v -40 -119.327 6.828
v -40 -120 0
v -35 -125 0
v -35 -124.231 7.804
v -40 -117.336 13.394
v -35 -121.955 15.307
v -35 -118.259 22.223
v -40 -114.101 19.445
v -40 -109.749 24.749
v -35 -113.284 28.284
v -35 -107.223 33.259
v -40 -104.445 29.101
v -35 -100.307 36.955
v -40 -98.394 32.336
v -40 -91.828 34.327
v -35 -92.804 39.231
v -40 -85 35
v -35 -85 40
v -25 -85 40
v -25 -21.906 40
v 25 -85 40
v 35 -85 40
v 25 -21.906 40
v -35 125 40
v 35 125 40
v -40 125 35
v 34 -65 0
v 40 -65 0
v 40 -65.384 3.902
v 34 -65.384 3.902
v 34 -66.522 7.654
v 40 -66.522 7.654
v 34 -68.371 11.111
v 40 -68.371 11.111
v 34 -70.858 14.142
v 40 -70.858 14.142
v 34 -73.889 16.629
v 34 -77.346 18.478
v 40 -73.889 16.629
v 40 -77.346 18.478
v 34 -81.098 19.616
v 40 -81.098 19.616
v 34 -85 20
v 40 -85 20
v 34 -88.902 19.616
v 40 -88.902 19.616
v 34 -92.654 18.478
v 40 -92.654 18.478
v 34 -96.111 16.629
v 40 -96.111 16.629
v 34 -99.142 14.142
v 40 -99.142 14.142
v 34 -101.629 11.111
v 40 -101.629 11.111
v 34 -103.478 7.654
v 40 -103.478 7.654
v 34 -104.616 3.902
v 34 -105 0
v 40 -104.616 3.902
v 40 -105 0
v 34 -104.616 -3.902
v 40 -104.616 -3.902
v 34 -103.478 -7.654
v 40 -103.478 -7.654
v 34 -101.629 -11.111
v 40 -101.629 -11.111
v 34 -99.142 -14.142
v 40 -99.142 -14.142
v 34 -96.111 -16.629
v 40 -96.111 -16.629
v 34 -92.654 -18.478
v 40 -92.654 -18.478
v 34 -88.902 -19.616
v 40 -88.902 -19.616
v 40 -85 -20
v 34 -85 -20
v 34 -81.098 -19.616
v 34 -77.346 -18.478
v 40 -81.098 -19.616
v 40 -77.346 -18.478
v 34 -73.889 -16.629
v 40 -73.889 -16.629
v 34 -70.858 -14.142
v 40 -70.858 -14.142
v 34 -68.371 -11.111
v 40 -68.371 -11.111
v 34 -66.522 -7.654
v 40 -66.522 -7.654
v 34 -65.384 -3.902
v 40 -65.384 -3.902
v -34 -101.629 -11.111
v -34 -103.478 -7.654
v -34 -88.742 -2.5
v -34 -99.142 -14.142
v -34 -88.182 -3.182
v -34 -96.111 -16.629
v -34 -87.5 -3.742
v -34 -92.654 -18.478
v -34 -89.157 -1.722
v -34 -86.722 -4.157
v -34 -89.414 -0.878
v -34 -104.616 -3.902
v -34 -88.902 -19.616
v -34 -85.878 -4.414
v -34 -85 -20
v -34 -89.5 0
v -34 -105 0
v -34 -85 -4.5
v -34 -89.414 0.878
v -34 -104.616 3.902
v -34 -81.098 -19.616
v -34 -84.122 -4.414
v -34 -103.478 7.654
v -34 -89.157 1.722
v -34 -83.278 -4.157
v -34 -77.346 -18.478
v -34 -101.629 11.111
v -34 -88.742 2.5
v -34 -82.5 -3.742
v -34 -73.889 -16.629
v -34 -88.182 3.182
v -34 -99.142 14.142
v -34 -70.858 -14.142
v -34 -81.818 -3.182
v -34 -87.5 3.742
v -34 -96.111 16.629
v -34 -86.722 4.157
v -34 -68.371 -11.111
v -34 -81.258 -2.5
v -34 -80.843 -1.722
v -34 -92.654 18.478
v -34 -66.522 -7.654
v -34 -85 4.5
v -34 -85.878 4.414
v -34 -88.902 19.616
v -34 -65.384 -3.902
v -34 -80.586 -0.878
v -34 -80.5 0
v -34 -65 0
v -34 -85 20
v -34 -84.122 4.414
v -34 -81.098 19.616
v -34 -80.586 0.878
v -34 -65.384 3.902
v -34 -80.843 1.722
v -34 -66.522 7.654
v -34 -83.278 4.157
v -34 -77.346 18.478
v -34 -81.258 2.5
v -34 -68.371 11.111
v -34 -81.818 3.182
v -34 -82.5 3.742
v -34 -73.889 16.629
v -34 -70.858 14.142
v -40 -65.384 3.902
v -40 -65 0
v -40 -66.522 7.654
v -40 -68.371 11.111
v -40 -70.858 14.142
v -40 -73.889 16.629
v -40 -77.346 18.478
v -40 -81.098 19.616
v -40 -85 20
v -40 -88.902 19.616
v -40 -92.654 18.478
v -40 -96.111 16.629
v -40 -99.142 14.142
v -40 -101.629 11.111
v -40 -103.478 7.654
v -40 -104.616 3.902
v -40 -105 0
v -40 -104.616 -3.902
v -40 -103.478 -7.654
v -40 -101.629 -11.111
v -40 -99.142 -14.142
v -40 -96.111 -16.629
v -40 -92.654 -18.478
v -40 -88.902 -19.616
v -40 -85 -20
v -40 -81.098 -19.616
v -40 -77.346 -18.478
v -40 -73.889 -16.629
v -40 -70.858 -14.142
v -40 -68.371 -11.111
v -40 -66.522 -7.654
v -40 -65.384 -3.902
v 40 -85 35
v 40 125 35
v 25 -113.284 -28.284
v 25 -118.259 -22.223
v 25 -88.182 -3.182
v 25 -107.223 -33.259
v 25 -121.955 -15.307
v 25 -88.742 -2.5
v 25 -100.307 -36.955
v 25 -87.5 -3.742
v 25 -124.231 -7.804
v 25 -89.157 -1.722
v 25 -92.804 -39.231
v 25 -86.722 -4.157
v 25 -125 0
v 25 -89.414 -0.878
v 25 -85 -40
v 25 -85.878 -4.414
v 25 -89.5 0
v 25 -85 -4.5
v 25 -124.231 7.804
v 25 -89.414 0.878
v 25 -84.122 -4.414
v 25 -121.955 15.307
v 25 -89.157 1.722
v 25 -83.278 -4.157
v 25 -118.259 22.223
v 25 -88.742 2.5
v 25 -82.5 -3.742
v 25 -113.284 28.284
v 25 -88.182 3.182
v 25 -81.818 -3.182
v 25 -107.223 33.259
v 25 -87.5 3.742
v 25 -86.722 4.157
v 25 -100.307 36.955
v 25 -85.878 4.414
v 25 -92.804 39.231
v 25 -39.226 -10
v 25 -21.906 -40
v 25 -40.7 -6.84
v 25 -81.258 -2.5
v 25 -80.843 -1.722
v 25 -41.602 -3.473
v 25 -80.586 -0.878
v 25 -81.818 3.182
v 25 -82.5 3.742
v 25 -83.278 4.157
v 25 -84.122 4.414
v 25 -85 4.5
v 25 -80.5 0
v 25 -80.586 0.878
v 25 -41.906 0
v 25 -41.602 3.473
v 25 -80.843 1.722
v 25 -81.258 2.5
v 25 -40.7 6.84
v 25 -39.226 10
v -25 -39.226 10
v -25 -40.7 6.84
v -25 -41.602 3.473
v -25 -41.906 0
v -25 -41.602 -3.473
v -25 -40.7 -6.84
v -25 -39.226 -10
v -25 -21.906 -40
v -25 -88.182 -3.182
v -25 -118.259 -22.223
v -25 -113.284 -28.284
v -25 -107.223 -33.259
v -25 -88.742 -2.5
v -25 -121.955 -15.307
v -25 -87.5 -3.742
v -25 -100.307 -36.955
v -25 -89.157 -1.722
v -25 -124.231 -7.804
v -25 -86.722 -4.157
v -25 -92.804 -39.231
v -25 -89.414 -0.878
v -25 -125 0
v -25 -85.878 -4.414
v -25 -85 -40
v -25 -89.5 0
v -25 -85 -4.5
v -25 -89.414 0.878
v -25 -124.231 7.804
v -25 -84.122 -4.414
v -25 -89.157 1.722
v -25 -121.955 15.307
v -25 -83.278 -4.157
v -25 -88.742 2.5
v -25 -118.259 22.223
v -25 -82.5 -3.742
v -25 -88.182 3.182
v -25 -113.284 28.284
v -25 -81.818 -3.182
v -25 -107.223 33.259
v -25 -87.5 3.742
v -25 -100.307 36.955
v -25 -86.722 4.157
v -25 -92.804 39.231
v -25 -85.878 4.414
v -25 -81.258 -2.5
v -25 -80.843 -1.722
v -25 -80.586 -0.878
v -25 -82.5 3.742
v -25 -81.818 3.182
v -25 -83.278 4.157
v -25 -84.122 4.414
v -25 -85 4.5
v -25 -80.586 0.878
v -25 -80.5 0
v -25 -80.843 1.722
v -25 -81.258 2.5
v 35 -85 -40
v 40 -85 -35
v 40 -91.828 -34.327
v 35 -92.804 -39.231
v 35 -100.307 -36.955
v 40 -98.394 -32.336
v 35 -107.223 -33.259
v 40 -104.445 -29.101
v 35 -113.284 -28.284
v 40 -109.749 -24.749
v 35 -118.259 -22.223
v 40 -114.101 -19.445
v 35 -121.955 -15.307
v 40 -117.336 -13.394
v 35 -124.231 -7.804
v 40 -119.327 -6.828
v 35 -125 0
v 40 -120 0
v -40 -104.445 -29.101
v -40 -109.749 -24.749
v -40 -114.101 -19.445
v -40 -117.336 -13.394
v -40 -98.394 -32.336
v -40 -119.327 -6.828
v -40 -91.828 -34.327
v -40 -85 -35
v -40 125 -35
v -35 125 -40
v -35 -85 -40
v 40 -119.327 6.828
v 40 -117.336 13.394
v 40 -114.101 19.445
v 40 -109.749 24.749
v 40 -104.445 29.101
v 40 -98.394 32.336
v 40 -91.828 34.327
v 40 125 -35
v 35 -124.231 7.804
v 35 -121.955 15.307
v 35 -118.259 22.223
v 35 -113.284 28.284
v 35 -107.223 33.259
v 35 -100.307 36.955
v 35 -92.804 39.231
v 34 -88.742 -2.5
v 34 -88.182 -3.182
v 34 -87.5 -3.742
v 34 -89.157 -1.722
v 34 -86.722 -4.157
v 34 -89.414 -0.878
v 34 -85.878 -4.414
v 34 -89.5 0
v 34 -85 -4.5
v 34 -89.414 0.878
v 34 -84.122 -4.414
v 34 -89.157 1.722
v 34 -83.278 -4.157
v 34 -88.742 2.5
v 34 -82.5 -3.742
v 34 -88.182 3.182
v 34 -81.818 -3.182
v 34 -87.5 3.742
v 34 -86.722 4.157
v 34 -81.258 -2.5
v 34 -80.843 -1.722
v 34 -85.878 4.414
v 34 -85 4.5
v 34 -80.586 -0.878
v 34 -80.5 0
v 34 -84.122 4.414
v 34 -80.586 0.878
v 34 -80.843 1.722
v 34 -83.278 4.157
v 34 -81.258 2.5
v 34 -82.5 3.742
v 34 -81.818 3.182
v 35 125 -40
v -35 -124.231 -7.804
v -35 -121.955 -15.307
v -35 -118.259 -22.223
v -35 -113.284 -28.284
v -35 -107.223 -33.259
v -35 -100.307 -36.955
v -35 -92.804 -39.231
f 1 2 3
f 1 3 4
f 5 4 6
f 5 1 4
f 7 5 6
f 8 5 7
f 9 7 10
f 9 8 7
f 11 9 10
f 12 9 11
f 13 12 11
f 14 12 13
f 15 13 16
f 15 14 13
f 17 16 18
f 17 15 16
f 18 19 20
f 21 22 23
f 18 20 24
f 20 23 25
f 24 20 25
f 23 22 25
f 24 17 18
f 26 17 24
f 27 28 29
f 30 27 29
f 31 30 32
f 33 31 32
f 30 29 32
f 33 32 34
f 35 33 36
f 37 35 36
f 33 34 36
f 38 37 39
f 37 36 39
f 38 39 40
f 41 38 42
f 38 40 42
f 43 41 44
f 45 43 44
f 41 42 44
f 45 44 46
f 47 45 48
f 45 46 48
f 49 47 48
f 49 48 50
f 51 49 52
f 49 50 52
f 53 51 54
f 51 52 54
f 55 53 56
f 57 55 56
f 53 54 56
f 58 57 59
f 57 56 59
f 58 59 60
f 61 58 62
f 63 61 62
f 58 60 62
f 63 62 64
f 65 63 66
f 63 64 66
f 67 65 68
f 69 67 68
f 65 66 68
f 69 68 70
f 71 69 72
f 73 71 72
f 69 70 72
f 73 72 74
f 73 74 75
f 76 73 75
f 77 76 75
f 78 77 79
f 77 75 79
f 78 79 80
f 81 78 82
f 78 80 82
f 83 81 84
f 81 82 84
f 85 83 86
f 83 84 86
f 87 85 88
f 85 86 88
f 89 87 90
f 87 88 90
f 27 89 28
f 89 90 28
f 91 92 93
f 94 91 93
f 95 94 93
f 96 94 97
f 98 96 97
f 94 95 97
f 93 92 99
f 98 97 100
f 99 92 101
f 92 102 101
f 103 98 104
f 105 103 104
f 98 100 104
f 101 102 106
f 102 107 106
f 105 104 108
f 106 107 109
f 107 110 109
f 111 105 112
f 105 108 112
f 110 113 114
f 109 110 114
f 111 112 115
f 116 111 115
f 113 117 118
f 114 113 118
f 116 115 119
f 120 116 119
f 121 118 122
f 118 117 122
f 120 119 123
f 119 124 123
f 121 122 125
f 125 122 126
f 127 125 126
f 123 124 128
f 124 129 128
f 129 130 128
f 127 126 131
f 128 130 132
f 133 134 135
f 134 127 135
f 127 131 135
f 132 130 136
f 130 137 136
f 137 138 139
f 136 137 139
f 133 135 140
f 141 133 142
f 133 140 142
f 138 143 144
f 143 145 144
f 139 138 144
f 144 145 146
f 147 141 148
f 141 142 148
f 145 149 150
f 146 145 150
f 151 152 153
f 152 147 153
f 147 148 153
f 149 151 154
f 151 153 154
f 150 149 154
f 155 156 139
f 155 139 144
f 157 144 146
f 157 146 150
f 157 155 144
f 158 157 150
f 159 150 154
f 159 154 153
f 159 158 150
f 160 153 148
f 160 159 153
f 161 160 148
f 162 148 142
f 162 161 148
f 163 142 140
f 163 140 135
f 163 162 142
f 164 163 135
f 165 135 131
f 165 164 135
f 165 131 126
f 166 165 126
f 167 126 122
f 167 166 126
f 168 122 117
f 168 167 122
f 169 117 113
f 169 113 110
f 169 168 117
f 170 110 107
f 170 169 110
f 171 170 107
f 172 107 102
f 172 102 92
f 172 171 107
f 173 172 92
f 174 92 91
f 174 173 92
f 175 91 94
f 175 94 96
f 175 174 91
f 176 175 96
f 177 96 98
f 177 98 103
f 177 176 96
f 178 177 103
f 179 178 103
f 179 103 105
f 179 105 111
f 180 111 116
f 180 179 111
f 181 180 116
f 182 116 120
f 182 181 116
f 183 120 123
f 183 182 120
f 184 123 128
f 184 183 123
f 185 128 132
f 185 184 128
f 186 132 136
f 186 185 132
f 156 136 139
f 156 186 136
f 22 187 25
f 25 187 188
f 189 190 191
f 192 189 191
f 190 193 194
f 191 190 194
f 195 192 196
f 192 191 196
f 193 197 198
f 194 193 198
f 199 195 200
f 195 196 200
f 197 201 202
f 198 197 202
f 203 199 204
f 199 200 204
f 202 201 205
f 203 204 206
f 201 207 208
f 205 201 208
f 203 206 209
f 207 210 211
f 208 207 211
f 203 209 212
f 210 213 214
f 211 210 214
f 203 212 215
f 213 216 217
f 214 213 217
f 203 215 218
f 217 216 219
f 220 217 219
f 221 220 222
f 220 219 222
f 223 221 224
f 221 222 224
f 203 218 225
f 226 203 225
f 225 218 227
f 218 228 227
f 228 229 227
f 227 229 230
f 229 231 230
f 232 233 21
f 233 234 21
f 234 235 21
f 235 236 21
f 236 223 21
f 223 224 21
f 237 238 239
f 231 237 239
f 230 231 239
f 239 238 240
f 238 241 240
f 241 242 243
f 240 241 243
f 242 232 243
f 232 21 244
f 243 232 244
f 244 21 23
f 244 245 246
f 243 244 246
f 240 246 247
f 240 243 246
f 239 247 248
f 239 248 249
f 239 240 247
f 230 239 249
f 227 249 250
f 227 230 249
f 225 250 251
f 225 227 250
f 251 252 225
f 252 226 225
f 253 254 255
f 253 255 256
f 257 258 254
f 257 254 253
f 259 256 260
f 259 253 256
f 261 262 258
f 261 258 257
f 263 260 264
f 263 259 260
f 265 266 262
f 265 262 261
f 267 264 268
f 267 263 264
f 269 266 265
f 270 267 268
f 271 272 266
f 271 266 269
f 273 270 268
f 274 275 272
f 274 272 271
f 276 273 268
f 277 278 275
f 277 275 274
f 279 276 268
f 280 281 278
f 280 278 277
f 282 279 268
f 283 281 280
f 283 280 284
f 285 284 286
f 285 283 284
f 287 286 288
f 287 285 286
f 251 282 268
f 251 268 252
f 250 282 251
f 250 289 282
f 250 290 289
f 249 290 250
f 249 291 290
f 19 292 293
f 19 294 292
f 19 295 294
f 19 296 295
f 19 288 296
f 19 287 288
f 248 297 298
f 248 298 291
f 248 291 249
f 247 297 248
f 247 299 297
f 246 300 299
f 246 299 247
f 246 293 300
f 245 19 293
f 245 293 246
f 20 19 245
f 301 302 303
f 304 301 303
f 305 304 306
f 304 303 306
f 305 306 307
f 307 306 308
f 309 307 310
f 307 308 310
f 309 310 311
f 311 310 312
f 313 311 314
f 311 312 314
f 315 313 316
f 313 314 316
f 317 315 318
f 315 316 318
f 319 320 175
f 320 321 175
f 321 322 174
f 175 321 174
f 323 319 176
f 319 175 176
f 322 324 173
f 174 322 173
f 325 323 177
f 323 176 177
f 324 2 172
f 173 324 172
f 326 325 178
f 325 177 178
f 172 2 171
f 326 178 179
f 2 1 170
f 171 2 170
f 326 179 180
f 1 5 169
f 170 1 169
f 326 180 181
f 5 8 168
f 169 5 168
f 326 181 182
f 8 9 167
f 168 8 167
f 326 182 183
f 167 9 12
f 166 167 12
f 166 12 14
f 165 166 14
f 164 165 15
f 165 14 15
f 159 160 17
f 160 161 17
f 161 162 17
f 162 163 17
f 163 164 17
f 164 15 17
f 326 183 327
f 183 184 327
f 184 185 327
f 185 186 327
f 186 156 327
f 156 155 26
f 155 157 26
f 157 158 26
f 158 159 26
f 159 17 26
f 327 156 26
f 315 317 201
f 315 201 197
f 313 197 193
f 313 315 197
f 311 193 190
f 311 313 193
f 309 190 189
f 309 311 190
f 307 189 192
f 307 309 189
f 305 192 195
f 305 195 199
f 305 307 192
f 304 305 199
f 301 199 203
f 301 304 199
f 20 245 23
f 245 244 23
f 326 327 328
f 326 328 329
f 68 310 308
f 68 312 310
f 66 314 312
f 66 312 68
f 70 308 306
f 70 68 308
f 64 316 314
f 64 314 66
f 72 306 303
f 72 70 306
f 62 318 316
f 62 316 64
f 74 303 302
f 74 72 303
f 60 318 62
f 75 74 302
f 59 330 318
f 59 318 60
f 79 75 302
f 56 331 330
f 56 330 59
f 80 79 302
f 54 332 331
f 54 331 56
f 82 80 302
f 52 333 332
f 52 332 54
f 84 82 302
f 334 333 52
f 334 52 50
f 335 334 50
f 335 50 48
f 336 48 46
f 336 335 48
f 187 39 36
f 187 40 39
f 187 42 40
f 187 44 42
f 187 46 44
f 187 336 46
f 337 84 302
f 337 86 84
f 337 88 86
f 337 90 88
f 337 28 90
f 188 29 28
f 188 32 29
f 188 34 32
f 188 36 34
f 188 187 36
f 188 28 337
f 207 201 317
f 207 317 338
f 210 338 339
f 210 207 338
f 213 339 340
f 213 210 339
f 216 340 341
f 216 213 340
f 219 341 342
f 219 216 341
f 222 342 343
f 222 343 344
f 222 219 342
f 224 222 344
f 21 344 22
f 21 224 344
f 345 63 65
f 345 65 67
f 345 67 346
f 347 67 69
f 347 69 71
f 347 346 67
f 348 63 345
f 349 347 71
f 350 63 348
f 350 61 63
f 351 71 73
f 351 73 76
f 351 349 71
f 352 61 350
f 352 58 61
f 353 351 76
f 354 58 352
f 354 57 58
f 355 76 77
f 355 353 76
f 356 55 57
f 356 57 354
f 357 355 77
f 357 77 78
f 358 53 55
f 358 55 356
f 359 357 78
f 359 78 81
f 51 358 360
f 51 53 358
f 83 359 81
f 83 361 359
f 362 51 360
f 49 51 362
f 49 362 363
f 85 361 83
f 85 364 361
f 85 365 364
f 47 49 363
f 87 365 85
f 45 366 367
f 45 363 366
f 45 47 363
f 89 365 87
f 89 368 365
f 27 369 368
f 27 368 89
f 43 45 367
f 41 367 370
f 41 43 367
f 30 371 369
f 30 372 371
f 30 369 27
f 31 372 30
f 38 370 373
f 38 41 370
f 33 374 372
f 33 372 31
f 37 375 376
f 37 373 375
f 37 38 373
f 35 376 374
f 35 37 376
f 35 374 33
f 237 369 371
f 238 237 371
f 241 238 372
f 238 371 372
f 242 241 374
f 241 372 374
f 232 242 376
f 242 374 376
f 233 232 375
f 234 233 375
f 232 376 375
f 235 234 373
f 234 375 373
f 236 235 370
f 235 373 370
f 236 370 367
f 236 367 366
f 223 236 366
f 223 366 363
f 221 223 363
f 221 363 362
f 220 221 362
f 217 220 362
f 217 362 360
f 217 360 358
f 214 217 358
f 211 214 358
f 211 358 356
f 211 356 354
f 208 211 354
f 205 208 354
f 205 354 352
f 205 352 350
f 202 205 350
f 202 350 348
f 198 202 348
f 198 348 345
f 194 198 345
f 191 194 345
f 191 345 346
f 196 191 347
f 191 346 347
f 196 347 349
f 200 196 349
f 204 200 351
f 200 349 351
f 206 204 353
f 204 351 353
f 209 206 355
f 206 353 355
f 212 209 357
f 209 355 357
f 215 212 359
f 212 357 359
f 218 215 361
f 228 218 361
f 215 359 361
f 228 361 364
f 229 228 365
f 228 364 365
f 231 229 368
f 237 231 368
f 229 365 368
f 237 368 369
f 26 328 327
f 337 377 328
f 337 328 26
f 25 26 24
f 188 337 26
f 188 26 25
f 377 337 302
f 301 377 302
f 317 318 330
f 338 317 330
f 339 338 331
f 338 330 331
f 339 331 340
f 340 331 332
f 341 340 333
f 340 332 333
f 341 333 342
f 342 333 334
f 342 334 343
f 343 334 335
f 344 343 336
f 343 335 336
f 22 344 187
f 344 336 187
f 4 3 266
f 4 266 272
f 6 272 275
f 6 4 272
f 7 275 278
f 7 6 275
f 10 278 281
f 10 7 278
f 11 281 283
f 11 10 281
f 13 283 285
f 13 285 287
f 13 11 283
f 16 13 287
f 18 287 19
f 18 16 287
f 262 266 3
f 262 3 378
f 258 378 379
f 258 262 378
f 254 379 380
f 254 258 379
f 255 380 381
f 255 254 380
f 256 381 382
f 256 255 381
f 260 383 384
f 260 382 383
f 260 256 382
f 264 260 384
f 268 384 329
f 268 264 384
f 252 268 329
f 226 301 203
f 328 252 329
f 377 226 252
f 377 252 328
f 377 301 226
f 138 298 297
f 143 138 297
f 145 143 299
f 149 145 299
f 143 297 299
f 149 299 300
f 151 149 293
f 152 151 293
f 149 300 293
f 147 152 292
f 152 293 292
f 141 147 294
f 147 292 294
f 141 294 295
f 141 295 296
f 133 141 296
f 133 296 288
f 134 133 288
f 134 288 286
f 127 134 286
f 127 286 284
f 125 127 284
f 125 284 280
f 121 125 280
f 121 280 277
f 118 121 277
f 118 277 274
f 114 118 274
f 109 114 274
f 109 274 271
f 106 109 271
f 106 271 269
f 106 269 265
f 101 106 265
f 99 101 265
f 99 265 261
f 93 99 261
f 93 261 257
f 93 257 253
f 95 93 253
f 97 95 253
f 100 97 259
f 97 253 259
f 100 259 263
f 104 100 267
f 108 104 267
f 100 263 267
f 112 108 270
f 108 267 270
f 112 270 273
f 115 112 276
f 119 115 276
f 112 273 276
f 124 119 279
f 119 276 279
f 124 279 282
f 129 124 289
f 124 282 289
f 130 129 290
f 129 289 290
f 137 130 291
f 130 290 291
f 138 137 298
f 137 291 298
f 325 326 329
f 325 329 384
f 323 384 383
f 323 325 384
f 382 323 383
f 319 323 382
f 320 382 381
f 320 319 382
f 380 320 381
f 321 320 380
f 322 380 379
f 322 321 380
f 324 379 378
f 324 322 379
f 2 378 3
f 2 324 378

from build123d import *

# Parameters (mm, degrees)
F0_W      = 250
F0_H      = 80
F1_DEPTH  = 40
F2_R      = 39.99999
F4_DEPTH  = 25
F5_R      = 20
F6_SIZE   = 5
F7_R      = 4.5
F8_DEPTH  = 80.001
F9_R      = 20
F10_DEPTH = 6


# Not quite as in the source:
# - a fillet or chamfer is up to 0.001 mm smaller than in the source, because OpenCascade refuses the exact size
# - a pattern or mirror of a feature is missing from the dataset's text; its kind, count and spacing are read off the source's solid


with BuildPart() as f1:
    # F0 (on Right) → F1 (new body, symmetric)
    with BuildSketch(Plane.YZ):
        Rectangle(F0_W, F0_H)
    extrude(amount=F1_DEPTH, both=True)

    # F2 (radius 40 in the source; OpenCascade refuses exactly that, so slightly less here)
    f2_edges = [f1.edges().sort_by_distance(p)[0] for p in [
        (0, -125, 40),
        (0, -125, -40),
    ]]
    fillet(f2_edges, radius=F2_R)

    # F3 (on Right) → F4 (cut, symmetric)
    with BuildSketch(Plane.YZ):
        Polygon((-21.9059892324, -40), (-45, 0), (-21.9059892324, 40), (-155.967399478, 40), (-155.967399478, -40), align=None)
    extrude(amount=F4_DEPTH, both=True, mode=Mode.SUBTRACT)

    # F5
    f5_edges = [f1.edges().sort_by_distance(p)[0] for p in [
        (0, -45, 0),
    ]]
    fillet(f5_edges, radius=F5_R)

    # F6
    f6_edges = [f1.edges().sort_by_distance(p)[0] for p in [
        (40, 19.999995, 40),
        (-40, 19.999995, 40),
        (40, -113.284274, 28.284274),
        (40, 19.999995, -40),
        (-40, 19.999995, -40),
        (40, -125, 0),
        (40, -113.284274, -28.284274),
        (-40, -113.284274, 28.284274),
        (-40, -125, 0),
        (-40, -113.284274, -28.284274),
    ]]
    chamfer(f6_edges, length=F6_SIZE)

    # F7 (on face) → F8 (cut, through all)
    with BuildSketch(Plane.YZ.offset(40)):
        with Locations((-85, 0)):
            Circle(F7_R)
    extrude(amount=-F8_DEPTH, mode=Mode.SUBTRACT)

    # F9 (on face) → F10 (cut)
    with BuildSketch(Plane.YZ.offset(40)):
        with Locations((-85, 0)):
            Circle(F9_R)
    f10 = extrude(amount=-F10_DEPTH, mode=Mode.SUBTRACT)

    # F10_copies: F10 across plane
    add(f10.mirror(Plane(origin=(0, 0, 0), x_dir=(0, 0, -1), z_dir=(-1, 0, 0))), mode=Mode.SUBTRACT)


solid = f1.part
